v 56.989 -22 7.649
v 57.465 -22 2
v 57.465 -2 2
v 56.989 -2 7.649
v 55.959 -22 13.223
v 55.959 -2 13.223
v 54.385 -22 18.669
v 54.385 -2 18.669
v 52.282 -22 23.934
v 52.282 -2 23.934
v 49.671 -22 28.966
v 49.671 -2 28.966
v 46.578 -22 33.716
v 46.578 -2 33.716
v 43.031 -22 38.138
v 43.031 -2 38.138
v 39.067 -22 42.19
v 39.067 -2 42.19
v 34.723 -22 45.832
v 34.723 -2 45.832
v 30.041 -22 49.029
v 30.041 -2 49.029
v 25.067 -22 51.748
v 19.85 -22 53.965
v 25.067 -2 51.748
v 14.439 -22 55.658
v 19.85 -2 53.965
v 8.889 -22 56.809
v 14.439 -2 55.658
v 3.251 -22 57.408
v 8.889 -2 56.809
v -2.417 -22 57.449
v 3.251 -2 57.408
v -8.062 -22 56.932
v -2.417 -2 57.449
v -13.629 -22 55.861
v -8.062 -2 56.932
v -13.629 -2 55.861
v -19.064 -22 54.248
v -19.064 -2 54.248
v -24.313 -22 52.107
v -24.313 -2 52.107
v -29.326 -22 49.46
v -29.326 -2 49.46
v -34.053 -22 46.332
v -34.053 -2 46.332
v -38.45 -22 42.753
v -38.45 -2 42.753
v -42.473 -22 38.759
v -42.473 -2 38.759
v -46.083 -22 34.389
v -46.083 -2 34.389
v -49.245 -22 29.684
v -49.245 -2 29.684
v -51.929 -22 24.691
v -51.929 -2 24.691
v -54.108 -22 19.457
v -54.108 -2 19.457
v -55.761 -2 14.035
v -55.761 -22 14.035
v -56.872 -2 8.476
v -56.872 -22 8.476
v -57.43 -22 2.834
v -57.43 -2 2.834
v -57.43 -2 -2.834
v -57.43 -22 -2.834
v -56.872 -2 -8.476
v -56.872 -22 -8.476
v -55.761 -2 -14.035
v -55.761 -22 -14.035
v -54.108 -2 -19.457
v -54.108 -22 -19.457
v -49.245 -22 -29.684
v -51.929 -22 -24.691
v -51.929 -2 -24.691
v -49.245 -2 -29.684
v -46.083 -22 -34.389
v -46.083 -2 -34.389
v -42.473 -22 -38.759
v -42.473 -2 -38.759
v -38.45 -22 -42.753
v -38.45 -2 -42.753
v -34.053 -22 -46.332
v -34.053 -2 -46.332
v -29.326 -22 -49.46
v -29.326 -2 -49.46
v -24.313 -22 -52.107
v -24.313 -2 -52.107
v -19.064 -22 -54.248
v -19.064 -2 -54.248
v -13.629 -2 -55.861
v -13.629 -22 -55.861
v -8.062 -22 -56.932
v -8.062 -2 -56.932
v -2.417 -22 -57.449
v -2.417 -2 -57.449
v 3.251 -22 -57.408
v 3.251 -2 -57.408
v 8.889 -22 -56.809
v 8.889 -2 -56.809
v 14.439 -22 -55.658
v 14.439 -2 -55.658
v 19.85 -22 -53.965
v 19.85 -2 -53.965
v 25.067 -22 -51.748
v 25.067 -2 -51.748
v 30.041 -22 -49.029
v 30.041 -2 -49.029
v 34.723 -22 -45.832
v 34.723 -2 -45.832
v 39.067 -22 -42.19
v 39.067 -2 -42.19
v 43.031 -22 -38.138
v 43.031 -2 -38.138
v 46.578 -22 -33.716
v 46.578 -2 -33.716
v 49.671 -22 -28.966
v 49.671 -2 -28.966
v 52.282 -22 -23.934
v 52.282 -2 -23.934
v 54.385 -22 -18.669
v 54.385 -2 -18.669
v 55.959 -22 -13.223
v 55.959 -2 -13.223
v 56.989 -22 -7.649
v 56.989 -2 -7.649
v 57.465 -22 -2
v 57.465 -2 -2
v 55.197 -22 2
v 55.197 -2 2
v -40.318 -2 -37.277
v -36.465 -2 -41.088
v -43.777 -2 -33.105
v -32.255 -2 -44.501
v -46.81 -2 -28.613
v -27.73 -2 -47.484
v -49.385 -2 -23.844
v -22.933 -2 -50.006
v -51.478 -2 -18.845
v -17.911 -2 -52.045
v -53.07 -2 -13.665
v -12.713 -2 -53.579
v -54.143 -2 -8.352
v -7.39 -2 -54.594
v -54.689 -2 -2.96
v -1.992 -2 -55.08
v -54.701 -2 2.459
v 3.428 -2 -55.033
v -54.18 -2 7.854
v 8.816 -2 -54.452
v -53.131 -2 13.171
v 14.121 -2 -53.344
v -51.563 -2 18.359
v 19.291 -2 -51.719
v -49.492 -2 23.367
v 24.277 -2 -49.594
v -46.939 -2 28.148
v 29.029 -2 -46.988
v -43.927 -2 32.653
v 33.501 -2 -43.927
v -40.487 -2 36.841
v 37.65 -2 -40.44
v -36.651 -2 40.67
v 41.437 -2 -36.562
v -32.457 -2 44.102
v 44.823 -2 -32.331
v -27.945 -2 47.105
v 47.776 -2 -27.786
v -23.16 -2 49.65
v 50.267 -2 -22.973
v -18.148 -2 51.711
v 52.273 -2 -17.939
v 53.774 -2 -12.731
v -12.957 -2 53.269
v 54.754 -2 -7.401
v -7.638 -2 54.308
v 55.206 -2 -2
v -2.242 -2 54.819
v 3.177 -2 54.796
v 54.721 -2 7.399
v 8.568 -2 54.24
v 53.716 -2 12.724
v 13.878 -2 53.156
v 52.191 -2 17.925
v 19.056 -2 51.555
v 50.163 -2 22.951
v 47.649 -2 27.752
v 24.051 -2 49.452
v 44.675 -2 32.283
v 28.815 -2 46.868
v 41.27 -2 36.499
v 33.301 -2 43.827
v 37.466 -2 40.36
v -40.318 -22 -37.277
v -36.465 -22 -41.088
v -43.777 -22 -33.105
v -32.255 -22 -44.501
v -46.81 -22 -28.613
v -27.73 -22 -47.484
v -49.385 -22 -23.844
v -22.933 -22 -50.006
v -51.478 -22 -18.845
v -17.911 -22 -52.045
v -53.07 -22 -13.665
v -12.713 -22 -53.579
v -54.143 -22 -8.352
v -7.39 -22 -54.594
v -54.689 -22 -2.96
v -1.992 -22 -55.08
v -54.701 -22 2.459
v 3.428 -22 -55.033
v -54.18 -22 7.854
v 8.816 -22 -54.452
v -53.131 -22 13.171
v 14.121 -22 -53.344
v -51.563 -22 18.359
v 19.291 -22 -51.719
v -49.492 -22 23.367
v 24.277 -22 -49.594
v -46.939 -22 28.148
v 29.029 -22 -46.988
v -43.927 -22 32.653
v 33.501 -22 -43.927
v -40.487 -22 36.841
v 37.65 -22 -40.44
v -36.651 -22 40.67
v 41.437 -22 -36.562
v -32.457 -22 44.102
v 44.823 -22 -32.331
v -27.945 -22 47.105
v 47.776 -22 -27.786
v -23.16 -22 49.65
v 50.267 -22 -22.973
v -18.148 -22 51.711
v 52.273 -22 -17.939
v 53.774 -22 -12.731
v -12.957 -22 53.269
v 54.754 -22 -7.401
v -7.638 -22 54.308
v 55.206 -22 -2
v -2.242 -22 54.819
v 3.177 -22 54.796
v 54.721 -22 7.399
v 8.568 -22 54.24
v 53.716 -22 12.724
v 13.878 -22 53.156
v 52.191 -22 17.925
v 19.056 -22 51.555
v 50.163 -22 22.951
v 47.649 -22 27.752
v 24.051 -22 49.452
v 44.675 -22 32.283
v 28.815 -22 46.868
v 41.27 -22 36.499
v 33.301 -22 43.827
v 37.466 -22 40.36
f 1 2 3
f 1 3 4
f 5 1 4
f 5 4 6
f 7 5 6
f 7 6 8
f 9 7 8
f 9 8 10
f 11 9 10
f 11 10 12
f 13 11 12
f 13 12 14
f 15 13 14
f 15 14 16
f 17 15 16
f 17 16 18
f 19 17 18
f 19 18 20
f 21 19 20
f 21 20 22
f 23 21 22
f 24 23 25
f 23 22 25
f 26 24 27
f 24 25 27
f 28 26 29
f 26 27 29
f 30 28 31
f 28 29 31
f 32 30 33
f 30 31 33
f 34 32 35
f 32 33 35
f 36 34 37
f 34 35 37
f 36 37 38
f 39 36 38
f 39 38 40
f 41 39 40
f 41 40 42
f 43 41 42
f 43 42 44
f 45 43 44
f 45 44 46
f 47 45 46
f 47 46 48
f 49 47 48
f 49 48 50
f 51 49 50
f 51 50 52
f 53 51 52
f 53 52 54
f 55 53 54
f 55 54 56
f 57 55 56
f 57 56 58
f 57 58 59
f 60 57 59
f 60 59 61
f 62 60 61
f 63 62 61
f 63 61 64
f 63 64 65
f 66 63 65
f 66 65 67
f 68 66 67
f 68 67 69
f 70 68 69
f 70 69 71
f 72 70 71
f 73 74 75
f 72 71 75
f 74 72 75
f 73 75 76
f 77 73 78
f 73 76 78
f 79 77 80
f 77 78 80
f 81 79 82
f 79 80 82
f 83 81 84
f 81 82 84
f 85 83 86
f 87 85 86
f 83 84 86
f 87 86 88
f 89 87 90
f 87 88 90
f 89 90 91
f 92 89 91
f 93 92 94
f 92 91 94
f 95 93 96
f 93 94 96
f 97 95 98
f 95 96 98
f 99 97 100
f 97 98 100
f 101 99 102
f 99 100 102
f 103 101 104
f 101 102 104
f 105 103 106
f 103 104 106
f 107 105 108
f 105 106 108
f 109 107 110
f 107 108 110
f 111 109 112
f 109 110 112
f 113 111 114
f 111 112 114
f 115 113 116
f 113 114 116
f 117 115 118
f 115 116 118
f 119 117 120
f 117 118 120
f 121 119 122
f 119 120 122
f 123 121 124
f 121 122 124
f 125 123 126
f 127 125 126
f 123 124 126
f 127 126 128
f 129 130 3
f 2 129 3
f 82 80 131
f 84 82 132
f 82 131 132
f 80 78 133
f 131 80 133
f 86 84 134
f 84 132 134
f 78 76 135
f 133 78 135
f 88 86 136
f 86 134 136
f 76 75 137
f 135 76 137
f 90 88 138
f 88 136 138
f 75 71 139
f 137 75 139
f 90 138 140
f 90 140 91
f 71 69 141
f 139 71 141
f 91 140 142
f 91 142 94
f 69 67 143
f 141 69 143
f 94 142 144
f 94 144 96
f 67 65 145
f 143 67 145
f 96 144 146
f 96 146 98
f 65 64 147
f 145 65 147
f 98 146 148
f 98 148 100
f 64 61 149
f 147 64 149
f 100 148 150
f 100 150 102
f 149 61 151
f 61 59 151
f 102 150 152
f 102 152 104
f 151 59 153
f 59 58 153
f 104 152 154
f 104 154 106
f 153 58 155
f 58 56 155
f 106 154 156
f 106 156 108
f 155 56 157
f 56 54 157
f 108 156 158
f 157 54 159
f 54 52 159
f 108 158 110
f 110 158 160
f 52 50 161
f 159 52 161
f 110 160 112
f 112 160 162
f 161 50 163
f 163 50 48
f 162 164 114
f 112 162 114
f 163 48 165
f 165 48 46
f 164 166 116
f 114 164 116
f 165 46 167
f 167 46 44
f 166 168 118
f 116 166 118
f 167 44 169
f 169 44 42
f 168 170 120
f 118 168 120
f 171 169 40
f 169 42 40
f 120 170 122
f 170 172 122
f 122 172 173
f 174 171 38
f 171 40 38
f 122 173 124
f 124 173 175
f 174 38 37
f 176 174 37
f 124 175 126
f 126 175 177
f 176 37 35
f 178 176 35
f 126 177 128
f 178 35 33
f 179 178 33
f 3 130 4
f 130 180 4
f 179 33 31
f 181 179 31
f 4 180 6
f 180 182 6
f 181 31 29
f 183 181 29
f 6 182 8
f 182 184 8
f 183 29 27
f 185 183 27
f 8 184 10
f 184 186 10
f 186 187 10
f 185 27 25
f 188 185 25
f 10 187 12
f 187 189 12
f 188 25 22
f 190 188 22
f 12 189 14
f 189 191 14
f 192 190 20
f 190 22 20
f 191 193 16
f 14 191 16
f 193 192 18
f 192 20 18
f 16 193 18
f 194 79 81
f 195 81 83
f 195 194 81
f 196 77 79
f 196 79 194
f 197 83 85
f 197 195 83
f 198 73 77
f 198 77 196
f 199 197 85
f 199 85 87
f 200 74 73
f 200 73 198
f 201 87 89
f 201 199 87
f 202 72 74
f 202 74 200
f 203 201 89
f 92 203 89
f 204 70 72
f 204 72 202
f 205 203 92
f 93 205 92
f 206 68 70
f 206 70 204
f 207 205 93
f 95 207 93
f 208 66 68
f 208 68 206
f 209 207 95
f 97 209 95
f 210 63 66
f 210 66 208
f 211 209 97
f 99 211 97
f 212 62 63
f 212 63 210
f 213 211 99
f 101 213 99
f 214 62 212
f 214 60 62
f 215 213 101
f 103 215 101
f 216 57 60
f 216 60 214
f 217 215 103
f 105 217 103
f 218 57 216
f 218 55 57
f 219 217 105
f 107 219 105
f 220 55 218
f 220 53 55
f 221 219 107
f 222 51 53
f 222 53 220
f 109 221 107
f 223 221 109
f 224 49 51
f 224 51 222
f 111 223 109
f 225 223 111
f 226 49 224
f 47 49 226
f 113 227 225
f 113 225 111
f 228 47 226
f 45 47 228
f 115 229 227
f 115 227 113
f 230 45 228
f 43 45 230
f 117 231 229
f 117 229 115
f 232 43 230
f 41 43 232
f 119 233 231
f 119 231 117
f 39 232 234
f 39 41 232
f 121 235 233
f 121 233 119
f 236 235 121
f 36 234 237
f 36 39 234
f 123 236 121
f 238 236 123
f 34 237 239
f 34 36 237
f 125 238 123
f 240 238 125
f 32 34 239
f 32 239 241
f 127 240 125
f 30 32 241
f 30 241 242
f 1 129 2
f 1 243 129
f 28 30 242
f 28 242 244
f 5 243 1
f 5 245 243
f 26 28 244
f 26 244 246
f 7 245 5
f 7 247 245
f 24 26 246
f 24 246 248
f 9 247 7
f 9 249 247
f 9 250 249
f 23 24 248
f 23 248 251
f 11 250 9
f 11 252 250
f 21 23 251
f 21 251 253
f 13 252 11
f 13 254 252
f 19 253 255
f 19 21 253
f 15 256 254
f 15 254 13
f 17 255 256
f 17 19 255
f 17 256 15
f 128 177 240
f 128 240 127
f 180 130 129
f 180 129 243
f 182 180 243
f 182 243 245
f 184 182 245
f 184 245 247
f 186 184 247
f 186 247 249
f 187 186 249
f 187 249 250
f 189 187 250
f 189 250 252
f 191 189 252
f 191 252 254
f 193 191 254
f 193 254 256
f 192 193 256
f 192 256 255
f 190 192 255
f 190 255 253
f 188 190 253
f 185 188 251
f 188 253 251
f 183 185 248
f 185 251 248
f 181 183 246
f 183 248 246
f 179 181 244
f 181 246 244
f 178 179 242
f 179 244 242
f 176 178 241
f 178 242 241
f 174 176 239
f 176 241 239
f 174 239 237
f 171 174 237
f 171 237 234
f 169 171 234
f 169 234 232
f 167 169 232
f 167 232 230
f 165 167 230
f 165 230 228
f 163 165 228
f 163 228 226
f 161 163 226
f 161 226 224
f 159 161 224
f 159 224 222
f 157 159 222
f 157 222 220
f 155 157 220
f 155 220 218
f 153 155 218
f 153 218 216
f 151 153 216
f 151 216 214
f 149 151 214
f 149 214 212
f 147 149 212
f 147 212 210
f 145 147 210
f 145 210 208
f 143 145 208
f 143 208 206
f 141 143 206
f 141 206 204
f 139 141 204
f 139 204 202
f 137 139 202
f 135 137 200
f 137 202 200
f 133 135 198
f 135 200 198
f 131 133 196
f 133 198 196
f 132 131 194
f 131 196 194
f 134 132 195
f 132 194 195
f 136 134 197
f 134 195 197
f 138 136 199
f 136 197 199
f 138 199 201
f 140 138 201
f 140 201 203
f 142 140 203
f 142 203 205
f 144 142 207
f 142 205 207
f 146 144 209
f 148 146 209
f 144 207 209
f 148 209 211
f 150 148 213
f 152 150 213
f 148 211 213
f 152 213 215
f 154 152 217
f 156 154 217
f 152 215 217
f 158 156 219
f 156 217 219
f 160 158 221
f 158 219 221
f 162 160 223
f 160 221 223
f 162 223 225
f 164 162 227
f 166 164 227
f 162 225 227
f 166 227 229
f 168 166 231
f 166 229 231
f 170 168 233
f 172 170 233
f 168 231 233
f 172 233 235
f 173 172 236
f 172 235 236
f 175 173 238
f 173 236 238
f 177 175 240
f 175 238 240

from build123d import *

# Parameters (mm, degrees)
SKETCH002_R     = 57.5
PAD002_DEPTH    = 20
SKETCH003_R     = 55
POCKET_DEPTH    = 25
SKETCH004_W     = 65.896674
SKETCH004_H     = 4
POCKET001_DEPTH = 21


with BuildPart() as part:
    # Sketch002 → Pad002 (new body)
    with BuildSketch(Plane.XZ):
        Circle(SKETCH002_R)
    extrude(amount=PAD002_DEPTH)

    # Sketch003 (on Face3 of Pad002) → Pocket (cut)
    with BuildSketch(Plane.XZ.offset(20)):
        with Locations((0.237796, -0.12528)):
            Circle(SKETCH003_R)
    extrude(amount=-POCKET_DEPTH, mode=Mode.SUBTRACT)

    # Sketch004 (on Face3 of Pocket) → Pocket001 (cut)
    with BuildSketch(Plane.XZ.offset(20)):
        with Locations((32.948337, 0)):
            Rectangle(SKETCH004_W, SKETCH004_H)
    extrude(amount=-POCKET001_DEPTH, mode=Mode.SUBTRACT)


with BuildPart() as part_1:
    # Body001 placement: moved
    add(part.part.moved(Location((0, -2, 0))))


solid = part_1.part
